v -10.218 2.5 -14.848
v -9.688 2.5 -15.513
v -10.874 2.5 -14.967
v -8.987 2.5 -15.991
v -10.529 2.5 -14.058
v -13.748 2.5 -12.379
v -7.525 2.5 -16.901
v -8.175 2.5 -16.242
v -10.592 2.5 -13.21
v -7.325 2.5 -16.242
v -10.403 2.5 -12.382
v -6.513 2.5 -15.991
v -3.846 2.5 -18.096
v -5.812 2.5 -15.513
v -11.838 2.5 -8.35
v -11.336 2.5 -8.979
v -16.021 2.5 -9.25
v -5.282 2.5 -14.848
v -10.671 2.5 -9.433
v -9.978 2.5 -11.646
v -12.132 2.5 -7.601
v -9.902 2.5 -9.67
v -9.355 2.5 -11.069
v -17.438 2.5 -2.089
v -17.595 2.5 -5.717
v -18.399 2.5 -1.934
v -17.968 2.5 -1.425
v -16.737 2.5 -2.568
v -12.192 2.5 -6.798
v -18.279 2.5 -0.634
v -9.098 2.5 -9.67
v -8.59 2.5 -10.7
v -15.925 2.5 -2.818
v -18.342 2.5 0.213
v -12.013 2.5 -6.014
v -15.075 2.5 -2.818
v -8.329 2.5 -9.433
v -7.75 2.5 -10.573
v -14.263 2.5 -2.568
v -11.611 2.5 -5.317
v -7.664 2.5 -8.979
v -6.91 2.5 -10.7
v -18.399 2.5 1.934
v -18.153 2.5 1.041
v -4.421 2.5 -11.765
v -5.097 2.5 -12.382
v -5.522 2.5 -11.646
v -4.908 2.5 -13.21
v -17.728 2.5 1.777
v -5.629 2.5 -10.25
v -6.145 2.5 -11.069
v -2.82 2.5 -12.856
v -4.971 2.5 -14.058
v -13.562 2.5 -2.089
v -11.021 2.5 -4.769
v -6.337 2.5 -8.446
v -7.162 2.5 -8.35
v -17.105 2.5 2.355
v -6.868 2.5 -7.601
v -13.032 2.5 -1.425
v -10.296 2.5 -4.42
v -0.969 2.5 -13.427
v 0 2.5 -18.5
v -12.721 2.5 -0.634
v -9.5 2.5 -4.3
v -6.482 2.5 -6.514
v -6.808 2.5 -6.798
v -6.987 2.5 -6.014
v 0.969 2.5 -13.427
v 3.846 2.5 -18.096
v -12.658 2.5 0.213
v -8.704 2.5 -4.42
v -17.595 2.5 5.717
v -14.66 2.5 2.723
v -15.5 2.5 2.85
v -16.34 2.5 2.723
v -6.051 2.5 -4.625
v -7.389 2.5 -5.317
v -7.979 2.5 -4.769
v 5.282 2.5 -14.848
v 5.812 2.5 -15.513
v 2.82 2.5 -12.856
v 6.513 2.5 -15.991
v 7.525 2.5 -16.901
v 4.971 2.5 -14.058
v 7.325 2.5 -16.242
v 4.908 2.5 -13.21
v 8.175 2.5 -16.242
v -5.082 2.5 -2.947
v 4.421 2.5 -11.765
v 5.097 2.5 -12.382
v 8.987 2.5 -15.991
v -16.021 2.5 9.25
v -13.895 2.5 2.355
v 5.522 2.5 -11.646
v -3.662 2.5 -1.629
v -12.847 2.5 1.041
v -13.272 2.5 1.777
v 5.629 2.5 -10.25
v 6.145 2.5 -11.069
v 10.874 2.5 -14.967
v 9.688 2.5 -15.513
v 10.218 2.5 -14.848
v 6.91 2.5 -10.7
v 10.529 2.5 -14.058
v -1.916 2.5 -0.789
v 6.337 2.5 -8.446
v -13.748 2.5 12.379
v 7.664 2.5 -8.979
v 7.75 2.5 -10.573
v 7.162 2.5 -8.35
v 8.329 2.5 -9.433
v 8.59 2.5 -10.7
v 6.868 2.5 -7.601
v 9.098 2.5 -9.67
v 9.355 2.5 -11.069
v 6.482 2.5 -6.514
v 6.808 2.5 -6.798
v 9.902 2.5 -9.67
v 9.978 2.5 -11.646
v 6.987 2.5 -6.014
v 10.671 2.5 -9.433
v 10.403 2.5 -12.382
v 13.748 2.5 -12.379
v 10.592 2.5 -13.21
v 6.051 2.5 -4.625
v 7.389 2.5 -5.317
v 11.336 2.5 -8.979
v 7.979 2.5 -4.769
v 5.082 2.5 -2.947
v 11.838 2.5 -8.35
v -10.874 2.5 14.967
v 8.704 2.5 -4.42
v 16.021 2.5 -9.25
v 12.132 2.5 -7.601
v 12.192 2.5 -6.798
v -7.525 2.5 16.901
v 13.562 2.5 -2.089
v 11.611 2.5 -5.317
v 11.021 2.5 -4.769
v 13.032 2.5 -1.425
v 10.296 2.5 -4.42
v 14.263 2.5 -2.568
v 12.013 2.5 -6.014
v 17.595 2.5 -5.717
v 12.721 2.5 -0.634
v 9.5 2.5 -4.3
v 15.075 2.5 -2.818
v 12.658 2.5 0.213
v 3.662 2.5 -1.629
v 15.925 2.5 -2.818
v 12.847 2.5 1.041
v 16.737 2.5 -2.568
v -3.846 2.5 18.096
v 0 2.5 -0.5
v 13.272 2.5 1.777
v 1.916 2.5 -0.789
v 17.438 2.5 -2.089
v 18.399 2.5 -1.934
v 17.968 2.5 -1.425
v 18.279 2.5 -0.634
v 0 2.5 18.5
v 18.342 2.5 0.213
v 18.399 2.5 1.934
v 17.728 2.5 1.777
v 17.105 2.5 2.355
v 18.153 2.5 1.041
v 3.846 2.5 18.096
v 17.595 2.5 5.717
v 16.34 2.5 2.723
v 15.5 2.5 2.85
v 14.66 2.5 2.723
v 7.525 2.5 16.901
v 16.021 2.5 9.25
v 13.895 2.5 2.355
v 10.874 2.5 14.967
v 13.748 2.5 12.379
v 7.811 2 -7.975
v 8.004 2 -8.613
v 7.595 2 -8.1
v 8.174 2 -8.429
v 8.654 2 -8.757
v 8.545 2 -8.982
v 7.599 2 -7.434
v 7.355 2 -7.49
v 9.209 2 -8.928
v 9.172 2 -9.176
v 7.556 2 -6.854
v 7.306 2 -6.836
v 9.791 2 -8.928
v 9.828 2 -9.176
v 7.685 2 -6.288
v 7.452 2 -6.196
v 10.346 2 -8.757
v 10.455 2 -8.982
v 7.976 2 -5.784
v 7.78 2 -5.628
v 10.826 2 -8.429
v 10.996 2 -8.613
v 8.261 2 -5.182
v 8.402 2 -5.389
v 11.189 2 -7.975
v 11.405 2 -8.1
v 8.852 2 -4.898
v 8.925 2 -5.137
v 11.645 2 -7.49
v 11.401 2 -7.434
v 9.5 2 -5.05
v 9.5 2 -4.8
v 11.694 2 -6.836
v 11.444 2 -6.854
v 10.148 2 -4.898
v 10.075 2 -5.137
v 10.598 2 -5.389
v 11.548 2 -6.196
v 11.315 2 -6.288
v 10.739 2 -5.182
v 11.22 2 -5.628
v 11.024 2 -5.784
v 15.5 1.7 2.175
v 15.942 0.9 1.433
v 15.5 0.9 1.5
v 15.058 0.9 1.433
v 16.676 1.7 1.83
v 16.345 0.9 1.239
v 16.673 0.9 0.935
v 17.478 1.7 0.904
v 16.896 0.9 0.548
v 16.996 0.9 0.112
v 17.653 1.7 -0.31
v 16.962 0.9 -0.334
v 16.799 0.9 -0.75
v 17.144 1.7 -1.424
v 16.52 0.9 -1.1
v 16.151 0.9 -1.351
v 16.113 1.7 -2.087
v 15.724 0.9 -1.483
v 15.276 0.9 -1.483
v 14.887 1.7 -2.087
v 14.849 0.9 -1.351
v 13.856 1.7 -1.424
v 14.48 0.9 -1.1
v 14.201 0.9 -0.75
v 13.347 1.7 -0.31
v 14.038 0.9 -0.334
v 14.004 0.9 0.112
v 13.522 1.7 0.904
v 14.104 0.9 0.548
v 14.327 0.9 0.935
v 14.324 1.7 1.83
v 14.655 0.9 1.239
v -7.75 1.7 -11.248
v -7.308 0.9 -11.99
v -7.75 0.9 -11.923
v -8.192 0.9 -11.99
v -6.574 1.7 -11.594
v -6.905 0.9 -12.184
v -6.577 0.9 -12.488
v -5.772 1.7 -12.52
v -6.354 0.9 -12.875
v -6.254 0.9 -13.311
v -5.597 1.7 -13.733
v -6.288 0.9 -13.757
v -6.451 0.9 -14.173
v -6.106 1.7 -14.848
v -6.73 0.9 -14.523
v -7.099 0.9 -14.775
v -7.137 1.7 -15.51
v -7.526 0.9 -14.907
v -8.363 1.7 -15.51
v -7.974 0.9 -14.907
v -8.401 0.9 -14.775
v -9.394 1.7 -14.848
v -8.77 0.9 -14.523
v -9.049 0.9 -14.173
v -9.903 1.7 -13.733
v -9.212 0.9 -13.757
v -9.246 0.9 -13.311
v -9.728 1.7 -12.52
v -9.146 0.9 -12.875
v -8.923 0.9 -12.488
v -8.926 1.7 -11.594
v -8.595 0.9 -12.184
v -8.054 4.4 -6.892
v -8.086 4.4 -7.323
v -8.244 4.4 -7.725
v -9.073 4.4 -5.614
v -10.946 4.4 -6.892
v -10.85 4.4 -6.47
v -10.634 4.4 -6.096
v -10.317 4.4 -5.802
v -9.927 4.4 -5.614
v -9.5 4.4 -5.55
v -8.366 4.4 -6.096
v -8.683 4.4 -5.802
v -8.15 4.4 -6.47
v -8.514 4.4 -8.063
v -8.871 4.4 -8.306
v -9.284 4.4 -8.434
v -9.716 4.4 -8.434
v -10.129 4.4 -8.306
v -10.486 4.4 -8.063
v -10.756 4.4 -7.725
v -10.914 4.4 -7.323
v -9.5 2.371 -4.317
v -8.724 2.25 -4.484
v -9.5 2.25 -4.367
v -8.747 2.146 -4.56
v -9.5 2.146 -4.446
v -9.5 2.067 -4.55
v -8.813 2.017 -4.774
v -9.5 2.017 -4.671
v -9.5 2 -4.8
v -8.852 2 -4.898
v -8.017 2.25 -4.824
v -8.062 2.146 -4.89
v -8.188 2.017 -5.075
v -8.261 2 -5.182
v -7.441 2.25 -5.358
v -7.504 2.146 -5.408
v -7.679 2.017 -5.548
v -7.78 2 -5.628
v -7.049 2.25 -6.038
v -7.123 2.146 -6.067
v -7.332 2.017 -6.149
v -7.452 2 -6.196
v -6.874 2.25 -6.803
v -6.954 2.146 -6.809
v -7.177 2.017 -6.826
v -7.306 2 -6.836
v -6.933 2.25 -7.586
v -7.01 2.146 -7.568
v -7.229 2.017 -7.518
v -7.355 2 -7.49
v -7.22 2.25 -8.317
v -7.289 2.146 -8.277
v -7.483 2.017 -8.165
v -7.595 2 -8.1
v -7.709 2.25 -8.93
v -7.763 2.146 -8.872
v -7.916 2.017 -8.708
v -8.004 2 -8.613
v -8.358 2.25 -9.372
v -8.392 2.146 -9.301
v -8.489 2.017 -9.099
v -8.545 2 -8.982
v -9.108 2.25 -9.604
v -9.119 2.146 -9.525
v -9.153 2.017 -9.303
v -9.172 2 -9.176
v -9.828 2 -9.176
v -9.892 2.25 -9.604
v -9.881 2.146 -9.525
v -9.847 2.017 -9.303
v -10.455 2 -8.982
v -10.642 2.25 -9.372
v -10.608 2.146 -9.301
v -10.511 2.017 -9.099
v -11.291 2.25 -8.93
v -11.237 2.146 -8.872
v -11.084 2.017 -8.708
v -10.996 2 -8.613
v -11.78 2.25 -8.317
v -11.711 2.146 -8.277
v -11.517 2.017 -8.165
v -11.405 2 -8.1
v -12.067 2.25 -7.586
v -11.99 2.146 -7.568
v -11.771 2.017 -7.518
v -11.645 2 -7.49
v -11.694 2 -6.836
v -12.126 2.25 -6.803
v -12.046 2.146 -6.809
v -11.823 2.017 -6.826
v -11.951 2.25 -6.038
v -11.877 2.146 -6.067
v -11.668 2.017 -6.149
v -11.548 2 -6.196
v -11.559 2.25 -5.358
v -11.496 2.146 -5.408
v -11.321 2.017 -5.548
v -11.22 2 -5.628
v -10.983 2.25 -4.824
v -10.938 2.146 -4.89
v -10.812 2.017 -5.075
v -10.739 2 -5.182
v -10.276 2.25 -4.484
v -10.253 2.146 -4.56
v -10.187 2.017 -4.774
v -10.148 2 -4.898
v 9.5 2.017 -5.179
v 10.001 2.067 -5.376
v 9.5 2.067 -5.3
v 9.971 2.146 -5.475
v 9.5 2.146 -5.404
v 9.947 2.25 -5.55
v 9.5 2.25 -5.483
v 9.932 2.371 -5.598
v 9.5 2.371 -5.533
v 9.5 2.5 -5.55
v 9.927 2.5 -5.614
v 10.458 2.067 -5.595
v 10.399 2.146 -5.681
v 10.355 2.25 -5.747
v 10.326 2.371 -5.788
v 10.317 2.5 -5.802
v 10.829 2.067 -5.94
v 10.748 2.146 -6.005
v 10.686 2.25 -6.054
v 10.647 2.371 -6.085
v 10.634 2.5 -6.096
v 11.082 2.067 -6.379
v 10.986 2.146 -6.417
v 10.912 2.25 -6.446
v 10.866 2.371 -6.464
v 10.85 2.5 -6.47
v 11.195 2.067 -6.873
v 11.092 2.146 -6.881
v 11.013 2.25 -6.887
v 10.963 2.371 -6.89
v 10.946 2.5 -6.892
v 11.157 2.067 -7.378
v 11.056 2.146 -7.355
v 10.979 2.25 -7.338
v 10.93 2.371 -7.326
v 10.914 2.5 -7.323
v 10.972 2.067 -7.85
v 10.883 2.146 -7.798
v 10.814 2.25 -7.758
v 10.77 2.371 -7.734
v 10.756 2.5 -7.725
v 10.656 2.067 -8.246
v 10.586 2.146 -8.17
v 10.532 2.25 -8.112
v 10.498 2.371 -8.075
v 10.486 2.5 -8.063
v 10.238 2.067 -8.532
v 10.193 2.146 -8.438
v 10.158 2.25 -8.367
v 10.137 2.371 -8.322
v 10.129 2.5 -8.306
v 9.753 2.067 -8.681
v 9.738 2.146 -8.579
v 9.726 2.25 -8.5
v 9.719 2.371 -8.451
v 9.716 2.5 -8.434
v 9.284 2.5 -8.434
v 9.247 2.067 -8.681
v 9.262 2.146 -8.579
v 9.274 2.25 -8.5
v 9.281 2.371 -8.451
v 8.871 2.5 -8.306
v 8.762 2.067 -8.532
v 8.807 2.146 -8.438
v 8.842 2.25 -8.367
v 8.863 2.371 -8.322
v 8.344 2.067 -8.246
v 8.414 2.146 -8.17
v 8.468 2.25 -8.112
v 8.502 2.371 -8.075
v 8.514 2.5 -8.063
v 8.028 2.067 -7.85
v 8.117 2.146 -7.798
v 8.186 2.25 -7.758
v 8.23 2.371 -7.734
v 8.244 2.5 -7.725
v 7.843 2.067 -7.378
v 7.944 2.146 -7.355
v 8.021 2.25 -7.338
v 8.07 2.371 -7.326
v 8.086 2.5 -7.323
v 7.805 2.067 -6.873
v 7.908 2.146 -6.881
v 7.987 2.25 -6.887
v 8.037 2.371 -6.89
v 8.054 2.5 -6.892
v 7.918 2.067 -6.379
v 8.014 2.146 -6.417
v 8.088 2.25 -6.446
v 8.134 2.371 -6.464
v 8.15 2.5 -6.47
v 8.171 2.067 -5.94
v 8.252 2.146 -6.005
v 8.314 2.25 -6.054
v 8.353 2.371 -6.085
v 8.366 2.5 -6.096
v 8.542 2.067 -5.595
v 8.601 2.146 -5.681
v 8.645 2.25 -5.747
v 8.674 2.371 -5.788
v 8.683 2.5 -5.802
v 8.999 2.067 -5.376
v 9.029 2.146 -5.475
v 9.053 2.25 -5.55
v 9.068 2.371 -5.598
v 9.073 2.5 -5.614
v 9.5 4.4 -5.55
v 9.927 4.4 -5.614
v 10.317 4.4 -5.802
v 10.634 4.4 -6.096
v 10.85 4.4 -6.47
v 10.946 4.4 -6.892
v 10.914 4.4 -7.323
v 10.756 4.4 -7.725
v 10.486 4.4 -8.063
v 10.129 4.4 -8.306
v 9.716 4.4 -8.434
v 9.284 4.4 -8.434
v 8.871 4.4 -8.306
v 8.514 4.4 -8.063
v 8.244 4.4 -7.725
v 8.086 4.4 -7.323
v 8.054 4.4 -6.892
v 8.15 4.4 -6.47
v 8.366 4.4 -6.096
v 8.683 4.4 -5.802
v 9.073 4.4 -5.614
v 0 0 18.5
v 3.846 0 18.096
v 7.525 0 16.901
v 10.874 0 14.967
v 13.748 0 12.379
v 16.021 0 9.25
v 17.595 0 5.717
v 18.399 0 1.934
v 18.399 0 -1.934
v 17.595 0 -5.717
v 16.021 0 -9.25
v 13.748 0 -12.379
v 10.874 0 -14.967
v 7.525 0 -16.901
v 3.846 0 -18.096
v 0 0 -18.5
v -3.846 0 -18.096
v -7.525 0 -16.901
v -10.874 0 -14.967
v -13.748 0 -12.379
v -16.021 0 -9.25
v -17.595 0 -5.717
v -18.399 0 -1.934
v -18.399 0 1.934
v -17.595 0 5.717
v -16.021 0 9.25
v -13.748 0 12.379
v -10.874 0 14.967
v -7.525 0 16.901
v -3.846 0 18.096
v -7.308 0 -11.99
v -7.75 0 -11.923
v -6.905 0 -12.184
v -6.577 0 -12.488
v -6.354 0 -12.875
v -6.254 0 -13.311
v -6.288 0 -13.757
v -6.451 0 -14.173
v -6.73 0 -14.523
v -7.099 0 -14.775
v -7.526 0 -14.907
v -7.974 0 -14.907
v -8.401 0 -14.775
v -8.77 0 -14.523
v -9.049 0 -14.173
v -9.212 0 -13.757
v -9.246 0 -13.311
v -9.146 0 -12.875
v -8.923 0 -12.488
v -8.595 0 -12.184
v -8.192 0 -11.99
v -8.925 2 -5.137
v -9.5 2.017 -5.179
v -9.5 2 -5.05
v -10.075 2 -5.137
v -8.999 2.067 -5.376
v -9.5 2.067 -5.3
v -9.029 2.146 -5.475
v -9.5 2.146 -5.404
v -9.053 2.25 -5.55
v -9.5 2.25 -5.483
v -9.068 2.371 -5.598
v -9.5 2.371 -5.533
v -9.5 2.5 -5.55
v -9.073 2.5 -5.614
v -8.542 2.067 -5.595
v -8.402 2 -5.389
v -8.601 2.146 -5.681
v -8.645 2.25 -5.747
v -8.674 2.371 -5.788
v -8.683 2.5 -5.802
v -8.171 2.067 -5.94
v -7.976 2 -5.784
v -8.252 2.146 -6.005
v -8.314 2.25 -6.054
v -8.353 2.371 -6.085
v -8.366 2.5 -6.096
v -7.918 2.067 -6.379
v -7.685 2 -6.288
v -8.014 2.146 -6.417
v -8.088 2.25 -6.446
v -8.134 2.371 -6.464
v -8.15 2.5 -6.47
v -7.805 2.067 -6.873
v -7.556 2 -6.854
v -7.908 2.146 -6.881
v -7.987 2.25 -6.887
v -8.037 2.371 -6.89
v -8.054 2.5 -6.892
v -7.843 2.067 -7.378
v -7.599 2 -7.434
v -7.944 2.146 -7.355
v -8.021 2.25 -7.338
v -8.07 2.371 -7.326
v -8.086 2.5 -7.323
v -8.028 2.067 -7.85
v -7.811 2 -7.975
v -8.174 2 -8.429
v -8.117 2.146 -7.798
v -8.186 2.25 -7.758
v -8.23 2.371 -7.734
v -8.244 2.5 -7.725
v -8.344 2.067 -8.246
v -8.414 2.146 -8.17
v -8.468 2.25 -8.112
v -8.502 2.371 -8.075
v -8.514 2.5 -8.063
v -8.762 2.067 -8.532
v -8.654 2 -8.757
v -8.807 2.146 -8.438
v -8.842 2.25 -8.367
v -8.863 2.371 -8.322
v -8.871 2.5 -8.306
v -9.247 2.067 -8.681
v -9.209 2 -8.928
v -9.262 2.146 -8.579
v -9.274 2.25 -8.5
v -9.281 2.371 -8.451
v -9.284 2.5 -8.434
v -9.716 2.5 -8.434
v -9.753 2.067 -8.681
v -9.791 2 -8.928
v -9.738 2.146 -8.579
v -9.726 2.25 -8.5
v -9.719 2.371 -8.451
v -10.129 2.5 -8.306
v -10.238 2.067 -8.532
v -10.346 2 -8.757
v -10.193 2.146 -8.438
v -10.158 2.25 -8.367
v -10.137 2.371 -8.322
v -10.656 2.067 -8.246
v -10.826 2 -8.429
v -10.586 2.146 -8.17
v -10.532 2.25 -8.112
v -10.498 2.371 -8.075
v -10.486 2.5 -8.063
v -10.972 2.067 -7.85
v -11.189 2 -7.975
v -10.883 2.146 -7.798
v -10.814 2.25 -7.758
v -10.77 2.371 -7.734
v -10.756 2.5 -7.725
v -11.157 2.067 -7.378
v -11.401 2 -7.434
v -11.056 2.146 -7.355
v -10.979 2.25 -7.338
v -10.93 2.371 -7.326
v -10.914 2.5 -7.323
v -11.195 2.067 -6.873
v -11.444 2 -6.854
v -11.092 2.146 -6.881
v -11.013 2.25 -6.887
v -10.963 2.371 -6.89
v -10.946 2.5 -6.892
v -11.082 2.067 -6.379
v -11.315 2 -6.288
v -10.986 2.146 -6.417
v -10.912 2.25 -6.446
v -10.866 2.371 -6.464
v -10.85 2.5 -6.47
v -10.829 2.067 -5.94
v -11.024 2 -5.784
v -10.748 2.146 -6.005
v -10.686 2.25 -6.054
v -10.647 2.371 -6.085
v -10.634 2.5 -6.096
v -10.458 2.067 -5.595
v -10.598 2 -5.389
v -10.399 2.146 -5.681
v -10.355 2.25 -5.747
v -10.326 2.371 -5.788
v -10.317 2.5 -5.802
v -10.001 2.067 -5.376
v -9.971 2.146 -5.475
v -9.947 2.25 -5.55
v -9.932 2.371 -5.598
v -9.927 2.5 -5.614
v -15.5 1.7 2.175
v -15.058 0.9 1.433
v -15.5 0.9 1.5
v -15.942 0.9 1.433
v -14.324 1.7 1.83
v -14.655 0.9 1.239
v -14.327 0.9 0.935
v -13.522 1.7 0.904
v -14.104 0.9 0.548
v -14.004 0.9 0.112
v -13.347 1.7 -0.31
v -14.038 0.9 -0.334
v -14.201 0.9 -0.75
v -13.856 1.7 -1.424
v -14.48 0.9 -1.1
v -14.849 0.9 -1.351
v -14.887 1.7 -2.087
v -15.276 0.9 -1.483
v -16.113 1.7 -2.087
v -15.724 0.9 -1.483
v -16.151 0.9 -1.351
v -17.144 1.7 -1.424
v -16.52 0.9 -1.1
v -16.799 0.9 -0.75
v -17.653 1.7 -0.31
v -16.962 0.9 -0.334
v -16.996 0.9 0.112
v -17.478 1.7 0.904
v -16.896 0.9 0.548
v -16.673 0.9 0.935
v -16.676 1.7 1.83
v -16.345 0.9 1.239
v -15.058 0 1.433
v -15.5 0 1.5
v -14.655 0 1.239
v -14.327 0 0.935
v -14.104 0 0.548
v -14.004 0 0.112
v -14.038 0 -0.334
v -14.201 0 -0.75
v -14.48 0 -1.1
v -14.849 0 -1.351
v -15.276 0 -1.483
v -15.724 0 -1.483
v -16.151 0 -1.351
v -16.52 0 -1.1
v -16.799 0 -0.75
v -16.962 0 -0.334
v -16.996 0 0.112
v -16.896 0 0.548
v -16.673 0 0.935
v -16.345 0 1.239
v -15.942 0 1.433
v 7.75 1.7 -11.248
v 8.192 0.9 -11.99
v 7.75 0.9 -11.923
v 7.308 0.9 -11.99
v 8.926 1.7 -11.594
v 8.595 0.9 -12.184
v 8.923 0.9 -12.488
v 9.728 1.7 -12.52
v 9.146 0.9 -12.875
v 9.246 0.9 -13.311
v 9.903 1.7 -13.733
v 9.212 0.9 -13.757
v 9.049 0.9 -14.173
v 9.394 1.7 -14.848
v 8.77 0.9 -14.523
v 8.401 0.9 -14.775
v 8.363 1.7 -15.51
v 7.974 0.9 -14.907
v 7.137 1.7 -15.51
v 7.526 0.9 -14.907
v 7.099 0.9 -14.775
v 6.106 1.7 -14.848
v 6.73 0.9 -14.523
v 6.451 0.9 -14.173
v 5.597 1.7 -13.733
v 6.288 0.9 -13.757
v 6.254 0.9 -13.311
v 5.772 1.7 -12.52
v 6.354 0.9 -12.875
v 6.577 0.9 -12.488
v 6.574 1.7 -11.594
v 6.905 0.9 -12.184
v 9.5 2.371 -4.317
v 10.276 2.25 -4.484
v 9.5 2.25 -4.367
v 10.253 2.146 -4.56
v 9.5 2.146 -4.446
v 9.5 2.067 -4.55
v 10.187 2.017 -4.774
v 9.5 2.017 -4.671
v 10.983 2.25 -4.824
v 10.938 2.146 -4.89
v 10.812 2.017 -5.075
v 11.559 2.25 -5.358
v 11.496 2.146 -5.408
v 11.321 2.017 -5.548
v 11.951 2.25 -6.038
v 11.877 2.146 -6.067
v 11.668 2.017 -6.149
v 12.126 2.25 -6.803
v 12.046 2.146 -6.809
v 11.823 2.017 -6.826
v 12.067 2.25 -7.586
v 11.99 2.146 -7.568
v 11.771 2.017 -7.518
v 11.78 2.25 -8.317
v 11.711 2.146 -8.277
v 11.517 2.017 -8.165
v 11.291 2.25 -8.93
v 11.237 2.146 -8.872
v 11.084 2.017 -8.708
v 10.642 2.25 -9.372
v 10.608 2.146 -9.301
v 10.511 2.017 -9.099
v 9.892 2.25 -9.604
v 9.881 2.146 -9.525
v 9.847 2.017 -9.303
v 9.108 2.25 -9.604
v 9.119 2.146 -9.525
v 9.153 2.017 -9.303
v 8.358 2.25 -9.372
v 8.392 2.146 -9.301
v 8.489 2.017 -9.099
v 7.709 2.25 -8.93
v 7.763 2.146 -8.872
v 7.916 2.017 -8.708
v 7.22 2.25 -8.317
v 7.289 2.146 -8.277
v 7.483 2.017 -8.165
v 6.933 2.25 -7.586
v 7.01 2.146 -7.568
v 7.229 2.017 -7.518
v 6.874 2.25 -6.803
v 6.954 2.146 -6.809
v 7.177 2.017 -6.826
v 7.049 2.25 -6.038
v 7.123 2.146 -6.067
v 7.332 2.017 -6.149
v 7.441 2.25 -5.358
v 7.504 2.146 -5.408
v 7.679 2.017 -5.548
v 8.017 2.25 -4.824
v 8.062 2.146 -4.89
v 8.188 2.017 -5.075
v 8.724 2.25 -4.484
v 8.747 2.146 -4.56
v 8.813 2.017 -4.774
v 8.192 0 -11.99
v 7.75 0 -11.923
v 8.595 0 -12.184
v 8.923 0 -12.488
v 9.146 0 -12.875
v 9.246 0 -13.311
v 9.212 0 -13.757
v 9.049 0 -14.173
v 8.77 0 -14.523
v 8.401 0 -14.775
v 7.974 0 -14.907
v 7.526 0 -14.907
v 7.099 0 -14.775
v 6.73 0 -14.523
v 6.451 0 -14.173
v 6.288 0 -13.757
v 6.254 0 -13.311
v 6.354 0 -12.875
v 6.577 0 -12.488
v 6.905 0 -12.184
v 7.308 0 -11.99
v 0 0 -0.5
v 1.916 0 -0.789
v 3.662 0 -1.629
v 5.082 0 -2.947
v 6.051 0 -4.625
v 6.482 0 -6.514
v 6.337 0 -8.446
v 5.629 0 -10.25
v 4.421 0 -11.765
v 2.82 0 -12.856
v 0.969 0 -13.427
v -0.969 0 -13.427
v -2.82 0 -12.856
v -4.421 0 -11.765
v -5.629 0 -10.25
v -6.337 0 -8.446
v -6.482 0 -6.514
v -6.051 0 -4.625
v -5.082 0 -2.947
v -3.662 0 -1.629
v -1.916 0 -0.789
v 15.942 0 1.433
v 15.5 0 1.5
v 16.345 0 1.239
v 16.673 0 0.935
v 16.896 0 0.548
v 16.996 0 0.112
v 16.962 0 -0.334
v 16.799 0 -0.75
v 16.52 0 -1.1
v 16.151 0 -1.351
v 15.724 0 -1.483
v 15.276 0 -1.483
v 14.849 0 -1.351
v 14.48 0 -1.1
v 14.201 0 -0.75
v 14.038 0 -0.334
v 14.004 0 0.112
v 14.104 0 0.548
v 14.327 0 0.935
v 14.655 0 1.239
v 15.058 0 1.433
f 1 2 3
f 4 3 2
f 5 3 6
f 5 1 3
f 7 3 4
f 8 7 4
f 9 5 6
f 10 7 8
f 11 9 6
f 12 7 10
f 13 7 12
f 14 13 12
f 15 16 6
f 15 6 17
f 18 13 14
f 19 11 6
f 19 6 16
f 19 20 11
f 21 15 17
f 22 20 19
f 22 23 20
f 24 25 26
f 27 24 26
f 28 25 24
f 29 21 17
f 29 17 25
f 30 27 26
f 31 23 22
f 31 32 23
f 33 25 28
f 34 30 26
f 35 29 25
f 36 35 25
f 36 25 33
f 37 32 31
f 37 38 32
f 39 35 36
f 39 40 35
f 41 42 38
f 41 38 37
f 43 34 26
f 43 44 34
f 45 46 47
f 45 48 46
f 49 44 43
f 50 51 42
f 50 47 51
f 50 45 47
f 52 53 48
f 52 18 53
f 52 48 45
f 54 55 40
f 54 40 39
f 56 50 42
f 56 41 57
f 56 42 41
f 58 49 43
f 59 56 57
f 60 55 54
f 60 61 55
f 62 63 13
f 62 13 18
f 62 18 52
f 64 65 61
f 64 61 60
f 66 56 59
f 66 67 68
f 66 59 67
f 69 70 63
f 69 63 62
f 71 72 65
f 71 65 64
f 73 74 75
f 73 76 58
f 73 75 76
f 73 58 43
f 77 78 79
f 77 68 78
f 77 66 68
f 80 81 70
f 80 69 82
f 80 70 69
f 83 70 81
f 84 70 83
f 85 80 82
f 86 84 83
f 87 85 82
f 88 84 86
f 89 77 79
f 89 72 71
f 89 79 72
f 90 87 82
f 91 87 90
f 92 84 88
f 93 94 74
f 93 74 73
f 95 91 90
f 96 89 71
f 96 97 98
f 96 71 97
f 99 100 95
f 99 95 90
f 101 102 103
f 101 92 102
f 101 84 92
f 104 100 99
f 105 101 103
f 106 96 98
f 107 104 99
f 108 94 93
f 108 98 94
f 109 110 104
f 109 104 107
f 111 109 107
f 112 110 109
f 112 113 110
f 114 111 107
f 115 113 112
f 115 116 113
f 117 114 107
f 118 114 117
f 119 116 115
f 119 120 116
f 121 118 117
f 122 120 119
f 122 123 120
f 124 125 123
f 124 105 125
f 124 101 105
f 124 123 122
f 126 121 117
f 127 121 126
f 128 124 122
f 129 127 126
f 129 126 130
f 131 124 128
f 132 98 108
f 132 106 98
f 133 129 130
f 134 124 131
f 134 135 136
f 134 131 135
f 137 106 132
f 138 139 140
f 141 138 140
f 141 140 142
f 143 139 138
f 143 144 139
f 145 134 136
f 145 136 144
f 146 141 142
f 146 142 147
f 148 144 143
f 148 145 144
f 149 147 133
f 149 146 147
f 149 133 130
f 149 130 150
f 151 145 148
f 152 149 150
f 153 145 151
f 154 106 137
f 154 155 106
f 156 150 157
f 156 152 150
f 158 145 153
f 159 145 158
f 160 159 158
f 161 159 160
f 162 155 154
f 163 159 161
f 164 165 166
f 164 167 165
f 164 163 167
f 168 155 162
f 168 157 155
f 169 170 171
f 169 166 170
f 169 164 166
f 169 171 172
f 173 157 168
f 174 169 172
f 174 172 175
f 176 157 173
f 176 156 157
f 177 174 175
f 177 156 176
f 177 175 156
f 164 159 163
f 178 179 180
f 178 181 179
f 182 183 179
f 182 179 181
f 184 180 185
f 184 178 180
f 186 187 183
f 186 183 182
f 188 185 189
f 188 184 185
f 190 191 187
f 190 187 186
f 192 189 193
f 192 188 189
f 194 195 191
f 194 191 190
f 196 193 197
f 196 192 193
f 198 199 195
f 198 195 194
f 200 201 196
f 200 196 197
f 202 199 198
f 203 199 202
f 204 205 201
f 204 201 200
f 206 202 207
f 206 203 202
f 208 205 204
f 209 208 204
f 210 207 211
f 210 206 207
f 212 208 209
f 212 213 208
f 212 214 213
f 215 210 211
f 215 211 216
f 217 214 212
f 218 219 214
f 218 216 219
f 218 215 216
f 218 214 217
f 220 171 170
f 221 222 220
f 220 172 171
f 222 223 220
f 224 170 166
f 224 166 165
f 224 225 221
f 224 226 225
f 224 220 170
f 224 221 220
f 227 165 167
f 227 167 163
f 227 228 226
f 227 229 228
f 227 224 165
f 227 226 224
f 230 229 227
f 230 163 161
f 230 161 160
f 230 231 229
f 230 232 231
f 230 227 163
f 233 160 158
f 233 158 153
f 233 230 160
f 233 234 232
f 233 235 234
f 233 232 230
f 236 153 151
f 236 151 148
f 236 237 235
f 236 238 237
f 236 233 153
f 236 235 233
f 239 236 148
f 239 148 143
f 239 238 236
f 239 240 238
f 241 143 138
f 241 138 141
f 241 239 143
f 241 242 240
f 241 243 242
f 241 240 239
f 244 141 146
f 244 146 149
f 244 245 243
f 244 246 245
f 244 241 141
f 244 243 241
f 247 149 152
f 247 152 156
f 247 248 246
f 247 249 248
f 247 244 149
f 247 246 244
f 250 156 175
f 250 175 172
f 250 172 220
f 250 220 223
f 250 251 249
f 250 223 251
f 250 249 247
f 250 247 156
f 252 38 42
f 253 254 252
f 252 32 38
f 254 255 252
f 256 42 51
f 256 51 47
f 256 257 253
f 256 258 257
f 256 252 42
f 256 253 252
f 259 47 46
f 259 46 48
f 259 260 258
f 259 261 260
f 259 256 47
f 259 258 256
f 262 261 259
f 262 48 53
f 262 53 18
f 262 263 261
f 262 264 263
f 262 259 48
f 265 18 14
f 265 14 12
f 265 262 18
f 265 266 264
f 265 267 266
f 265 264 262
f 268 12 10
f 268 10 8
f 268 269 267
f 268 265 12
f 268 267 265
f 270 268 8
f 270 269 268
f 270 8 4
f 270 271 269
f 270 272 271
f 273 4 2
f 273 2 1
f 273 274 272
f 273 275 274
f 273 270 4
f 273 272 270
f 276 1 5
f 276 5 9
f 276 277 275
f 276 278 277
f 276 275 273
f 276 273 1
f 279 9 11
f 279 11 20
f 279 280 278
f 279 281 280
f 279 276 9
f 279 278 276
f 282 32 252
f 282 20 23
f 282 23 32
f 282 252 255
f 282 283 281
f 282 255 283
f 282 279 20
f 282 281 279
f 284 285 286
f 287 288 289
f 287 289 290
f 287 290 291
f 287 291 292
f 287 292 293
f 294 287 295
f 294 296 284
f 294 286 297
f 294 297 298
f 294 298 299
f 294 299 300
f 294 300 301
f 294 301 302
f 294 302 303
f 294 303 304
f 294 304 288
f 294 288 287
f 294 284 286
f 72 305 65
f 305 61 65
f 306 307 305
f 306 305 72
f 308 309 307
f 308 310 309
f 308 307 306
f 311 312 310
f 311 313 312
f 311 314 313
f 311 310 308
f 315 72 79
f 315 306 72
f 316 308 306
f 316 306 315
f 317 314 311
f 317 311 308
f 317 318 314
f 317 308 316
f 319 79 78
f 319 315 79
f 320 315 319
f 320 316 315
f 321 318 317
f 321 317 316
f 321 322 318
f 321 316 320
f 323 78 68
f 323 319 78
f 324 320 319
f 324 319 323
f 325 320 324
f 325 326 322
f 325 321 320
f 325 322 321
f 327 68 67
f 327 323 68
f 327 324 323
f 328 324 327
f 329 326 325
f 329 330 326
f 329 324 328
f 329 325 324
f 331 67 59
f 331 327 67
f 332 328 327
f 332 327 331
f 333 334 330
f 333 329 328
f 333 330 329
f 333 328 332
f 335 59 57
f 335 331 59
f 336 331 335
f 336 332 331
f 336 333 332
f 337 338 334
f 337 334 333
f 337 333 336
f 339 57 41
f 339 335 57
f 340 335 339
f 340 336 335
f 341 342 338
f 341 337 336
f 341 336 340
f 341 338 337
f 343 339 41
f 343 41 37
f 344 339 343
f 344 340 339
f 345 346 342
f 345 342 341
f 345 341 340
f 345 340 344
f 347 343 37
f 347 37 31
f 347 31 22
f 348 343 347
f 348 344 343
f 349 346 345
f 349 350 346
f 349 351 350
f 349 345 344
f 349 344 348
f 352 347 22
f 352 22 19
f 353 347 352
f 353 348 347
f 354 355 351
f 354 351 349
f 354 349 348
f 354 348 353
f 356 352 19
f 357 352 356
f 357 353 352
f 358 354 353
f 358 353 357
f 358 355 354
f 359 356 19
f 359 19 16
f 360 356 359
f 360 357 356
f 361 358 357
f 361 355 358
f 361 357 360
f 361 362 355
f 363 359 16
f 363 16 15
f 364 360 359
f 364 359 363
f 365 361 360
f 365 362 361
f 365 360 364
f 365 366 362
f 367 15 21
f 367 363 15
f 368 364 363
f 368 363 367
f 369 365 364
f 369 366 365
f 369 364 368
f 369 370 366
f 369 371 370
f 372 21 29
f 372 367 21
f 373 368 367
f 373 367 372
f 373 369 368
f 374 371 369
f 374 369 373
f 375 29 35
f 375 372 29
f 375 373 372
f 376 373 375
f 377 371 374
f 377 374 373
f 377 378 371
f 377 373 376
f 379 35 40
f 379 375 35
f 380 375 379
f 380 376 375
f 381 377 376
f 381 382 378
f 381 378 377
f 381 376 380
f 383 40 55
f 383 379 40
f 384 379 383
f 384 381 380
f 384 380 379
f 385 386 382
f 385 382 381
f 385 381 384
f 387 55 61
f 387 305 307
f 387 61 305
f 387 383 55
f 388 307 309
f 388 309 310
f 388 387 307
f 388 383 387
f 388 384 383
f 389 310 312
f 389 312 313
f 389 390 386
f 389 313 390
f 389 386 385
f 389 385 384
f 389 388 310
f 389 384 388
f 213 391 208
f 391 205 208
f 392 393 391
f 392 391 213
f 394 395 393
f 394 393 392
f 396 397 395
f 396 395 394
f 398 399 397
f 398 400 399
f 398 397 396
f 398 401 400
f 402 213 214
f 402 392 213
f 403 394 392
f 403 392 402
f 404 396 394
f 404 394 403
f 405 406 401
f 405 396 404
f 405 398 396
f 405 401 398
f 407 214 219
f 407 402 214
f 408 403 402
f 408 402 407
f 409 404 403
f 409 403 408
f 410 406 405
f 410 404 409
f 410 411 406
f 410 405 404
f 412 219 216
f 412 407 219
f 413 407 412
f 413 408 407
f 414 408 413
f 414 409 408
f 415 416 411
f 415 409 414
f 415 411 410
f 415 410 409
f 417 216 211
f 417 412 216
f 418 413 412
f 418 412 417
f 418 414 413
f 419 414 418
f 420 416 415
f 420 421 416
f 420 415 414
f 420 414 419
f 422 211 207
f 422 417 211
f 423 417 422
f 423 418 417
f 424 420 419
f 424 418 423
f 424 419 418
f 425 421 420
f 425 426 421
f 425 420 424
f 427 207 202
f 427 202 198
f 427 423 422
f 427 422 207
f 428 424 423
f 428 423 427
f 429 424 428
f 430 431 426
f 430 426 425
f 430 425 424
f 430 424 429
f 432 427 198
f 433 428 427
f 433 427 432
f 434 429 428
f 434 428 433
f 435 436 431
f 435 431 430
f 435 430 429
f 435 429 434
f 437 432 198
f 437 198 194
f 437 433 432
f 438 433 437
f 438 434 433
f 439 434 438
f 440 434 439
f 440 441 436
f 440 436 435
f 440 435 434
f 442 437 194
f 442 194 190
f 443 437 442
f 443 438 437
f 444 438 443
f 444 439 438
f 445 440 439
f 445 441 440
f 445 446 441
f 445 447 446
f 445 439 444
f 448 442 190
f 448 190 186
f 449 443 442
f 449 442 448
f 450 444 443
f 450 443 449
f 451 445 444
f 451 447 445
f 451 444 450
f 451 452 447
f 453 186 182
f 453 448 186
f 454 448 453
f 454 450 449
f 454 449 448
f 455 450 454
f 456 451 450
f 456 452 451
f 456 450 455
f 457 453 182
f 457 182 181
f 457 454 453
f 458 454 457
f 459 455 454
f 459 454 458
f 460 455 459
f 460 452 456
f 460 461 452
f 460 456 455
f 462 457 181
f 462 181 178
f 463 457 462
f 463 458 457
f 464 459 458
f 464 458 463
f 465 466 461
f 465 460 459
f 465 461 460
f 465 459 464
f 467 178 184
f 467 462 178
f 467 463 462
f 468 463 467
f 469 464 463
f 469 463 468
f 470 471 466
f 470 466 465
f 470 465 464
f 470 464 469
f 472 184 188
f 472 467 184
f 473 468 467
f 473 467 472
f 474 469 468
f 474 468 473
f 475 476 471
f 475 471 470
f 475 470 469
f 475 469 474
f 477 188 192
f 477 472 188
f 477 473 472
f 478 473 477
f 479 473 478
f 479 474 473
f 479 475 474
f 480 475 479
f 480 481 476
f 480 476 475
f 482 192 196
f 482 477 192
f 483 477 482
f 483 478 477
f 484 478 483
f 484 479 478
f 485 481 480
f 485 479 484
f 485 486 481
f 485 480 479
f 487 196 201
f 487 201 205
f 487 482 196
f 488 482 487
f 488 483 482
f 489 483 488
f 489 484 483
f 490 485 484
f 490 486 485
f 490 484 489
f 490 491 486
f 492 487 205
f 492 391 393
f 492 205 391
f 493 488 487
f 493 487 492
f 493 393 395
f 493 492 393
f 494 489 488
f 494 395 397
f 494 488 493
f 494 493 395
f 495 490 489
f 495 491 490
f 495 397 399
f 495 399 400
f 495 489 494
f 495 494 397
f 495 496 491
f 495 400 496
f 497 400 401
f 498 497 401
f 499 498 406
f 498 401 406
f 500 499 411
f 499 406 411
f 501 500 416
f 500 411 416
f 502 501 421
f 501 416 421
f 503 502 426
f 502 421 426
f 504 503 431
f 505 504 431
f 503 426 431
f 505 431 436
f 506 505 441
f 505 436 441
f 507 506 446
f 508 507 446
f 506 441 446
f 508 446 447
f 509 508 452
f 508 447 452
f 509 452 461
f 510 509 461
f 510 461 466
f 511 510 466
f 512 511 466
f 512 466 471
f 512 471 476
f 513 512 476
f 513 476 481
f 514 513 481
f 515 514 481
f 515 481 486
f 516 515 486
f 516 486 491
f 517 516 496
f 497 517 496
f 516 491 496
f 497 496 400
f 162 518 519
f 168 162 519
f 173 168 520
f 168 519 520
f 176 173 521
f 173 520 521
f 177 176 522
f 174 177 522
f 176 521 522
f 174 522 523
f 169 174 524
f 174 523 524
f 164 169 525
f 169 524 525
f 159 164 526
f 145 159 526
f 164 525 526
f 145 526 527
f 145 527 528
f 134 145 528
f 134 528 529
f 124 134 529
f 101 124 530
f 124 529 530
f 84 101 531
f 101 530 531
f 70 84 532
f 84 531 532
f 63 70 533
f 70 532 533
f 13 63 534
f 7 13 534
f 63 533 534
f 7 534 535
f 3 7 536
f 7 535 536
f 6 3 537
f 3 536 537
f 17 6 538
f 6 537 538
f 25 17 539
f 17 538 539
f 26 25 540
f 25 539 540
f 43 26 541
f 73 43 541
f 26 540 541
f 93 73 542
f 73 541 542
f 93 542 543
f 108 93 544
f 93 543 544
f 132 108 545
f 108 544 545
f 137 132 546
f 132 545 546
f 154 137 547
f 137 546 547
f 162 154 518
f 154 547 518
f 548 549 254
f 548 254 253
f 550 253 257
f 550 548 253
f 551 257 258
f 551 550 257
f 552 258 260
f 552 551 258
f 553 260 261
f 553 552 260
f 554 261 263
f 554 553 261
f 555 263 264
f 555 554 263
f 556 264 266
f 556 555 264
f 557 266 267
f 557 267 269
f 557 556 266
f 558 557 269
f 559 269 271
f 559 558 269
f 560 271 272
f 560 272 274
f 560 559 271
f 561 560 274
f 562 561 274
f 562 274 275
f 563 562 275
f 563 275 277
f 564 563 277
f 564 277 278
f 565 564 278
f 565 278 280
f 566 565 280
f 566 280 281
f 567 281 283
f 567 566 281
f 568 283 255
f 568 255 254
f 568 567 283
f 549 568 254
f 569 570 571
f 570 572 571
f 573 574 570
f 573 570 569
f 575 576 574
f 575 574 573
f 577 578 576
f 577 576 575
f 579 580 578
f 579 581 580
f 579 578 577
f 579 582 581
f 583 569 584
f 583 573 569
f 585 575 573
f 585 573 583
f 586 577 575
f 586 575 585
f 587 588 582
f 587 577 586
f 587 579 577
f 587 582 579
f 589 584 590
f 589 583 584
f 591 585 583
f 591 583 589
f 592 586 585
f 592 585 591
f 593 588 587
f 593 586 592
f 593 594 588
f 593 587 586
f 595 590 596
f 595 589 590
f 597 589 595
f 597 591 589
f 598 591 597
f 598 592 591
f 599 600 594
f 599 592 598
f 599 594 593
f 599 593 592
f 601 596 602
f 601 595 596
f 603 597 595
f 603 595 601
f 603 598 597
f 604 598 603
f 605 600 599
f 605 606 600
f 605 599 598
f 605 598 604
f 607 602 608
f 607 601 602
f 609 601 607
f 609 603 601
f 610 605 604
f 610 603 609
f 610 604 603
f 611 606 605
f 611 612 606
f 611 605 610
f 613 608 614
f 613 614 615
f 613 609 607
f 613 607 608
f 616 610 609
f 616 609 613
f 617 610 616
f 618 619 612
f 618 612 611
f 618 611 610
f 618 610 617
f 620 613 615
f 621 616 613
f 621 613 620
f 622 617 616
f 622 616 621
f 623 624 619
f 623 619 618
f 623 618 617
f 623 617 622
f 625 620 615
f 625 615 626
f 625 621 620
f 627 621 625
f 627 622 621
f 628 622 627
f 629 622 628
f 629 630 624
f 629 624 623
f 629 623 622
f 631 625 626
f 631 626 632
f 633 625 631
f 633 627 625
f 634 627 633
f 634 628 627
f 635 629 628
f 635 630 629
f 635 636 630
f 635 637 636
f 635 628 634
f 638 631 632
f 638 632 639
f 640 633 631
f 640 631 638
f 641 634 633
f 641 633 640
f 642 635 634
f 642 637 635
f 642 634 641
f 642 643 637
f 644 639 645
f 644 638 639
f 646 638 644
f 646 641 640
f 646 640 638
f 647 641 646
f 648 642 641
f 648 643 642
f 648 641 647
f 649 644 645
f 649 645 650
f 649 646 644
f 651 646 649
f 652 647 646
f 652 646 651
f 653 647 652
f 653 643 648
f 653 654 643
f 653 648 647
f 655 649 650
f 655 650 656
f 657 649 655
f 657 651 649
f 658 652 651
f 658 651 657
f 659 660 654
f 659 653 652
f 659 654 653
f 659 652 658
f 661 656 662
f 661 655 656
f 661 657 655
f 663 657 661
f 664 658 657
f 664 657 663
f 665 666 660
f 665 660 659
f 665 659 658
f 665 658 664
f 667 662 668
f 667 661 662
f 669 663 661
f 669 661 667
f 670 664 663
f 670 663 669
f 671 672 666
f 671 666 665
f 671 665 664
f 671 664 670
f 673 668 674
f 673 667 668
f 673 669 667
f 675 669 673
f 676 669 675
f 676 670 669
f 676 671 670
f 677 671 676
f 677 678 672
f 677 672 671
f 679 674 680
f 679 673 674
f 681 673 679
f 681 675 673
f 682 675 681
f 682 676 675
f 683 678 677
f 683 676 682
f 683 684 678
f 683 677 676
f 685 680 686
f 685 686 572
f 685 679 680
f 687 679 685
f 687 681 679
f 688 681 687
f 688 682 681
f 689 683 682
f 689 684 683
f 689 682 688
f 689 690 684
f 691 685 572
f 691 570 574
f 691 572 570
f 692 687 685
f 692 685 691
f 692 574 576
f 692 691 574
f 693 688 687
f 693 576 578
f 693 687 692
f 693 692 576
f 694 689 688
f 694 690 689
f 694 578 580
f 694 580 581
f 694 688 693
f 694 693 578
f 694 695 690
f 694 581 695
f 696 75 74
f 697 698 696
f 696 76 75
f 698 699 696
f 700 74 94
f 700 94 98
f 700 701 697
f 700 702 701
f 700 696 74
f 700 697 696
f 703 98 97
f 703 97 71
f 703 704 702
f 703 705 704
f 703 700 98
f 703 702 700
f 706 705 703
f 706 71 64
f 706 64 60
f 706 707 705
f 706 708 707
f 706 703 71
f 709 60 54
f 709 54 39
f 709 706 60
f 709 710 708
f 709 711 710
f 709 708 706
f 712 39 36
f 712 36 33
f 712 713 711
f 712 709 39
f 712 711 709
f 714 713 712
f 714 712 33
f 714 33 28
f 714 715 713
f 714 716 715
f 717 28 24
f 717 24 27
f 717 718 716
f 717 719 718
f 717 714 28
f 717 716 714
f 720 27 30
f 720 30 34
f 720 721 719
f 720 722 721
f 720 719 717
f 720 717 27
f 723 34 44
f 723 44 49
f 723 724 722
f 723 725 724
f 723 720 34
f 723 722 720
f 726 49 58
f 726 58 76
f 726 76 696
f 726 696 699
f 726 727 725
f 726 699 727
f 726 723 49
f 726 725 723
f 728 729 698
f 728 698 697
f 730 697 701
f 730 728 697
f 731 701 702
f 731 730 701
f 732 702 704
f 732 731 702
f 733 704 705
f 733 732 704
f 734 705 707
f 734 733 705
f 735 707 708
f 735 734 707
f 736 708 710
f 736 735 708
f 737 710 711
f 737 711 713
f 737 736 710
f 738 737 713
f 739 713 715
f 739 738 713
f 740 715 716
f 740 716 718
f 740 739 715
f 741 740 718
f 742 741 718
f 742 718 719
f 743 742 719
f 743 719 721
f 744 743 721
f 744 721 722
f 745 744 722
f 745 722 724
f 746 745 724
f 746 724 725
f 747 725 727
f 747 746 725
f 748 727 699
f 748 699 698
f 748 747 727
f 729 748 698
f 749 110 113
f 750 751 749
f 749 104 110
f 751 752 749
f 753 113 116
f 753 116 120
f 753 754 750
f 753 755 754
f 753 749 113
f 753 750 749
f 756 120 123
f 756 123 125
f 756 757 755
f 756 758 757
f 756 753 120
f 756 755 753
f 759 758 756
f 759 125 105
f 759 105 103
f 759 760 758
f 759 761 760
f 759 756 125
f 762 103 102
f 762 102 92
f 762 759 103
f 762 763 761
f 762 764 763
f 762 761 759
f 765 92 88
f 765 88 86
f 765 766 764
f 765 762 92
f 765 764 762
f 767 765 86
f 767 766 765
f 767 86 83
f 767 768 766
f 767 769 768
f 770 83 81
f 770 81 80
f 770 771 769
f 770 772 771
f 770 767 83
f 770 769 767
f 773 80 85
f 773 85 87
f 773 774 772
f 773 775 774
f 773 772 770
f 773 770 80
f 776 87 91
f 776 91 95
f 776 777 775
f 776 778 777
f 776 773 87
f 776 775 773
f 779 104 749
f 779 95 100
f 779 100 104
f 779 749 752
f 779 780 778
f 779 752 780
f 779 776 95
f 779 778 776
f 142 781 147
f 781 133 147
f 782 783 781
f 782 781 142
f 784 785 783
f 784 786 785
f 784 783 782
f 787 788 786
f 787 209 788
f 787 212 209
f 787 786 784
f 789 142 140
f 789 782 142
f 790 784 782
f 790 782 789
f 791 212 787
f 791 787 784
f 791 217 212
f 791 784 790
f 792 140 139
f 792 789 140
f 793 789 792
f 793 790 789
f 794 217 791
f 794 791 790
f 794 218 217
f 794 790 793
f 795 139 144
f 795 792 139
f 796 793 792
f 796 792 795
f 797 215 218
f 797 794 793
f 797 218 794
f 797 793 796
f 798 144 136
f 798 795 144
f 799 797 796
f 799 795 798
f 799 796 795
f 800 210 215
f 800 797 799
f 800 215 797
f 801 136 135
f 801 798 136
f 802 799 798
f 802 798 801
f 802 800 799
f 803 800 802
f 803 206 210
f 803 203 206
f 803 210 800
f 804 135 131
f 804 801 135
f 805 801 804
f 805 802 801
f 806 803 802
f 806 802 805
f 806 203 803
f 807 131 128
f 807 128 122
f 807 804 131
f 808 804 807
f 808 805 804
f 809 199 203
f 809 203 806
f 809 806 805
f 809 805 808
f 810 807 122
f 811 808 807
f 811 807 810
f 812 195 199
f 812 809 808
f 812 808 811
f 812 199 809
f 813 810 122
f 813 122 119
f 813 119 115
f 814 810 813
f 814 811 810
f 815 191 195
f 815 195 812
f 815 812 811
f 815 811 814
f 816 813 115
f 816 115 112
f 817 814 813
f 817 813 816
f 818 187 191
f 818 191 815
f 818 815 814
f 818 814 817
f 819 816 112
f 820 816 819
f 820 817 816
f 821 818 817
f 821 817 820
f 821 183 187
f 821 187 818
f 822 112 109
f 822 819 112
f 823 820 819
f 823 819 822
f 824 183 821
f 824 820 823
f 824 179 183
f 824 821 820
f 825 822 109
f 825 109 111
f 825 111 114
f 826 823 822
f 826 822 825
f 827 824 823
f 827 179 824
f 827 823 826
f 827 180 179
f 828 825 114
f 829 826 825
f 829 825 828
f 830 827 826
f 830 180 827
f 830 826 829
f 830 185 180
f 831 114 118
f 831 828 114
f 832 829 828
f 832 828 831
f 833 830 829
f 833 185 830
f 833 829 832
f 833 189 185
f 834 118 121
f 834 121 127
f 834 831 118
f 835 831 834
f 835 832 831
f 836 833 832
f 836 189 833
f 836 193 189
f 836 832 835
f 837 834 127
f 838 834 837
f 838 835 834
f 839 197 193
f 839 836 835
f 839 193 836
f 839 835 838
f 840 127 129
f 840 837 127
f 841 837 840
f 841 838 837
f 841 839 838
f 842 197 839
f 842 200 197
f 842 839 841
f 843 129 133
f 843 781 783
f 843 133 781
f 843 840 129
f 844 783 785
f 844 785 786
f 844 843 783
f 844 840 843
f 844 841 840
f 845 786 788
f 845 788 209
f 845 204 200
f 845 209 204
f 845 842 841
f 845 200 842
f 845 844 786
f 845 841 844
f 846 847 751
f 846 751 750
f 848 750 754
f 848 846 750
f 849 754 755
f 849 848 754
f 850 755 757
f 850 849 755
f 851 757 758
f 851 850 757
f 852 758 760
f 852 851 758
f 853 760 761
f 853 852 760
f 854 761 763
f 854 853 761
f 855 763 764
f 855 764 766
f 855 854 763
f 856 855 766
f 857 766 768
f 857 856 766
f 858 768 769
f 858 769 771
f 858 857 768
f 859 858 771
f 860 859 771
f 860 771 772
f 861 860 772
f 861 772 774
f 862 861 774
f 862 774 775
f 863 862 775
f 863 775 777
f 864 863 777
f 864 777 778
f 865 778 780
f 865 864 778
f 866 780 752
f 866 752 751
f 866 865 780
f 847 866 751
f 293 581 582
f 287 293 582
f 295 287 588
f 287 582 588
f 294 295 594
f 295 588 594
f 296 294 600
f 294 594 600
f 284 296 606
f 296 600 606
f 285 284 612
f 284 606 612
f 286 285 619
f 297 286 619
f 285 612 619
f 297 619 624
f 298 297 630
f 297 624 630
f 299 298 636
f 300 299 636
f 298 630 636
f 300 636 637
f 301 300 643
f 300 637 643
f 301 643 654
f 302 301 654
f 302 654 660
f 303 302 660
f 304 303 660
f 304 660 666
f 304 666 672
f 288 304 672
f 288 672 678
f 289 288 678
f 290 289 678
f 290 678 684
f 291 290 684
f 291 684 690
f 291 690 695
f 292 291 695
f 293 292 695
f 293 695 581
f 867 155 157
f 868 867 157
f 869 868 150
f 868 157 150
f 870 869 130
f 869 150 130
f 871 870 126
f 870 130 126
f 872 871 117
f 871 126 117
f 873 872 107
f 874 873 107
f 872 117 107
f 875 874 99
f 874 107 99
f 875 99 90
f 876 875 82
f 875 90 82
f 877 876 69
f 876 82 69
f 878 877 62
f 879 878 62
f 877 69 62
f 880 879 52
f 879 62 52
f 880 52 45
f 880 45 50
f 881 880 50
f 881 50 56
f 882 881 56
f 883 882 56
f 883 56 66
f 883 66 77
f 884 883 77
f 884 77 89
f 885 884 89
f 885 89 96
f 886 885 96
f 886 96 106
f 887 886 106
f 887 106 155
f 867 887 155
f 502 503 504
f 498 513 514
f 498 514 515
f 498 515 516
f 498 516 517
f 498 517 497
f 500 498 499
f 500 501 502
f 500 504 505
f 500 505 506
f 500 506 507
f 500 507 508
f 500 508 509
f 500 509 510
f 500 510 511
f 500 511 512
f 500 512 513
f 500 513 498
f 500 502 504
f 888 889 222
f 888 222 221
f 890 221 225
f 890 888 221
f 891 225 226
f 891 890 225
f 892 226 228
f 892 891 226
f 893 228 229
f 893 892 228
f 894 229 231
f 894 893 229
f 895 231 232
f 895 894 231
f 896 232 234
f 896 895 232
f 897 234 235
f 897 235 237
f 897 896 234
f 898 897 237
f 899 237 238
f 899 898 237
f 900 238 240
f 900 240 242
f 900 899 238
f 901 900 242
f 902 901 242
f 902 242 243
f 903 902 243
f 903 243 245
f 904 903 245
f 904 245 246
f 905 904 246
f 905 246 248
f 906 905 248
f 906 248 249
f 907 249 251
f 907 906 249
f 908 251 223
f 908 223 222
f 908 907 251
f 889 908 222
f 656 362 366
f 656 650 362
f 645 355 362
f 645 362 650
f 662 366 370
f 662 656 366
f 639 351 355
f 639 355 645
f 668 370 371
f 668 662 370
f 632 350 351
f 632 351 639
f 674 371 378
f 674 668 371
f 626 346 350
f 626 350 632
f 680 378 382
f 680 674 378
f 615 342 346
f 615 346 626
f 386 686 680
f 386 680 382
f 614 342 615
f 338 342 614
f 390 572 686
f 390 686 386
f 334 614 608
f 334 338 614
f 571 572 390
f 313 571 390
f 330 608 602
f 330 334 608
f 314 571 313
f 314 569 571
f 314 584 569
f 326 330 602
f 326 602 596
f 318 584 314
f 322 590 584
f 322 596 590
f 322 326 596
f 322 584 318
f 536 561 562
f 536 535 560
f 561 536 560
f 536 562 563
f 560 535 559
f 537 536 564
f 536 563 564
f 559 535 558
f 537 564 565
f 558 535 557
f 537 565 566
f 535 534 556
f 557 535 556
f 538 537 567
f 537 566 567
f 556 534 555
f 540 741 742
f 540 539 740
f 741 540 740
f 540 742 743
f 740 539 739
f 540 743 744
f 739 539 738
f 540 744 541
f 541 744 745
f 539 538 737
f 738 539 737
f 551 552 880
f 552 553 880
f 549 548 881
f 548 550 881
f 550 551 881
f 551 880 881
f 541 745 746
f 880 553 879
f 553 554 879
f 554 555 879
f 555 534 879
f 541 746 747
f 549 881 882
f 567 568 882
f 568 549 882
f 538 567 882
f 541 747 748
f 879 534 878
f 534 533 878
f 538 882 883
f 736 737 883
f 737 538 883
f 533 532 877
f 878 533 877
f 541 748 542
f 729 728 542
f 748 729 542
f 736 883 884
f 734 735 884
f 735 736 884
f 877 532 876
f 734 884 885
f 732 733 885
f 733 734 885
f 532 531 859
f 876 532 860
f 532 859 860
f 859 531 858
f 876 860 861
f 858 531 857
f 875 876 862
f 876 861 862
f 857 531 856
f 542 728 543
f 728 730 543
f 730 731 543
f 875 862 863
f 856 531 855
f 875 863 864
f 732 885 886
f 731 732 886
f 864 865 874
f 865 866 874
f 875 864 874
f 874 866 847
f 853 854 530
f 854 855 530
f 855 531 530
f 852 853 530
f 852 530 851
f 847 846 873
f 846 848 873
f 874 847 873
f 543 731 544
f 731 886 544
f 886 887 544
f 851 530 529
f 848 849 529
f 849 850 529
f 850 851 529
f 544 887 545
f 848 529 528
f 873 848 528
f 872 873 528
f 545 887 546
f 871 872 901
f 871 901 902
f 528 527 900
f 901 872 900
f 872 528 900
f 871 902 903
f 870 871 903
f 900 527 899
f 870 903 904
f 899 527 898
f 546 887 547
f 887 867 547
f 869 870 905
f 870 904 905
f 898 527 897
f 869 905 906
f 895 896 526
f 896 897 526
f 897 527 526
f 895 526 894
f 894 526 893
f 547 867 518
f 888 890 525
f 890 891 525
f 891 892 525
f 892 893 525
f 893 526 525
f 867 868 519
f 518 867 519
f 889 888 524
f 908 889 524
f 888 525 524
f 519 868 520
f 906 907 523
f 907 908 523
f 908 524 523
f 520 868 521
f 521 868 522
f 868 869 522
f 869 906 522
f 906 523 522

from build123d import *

# Parameters (mm, degrees)
SKETCH1_R                = 18.5
SKETCH1_R_2              = 1.5
BOSS_EXTRUDE1_DEPTH      = 2.5
BOSS_EXTRUDE2_DEPTH      = 1.9
BOSS_EXTRUDE2_DEPTH_BACK = 1
SKETCH2_R                = 1.45
CUT_EXTRUDE3_START       = -0.5
SKETCH6_R                = 2.7
SKETCH6_R_2              = 1.45
CUT_EXTRUDE3_DEPTH       = 0.5
SKETCH4_R                = 6.5
CUT_EXTRUDE1_DEPTH       = 27.282123202
CHAMFER1_SIZE            = 1.35
CHAMFER1_SIZE2           = 1.6
FILLET1_R                = 0.5


with BuildPart() as part:
    # Sketch1 → Boss-Extrude1 (new body)
    with BuildSketch(Plane(origin=(0, 0, 0), x_dir=(1, 0, 0), z_dir=(0, 1, 0))):
        with Locations(Location((0, 0, 0), (0, 0, 270))):
            Circle(SKETCH1_R)
        with Locations(Location((-7.75, 13.423393759, 0), (0, 0, 270))):
            Circle(SKETCH1_R_2, mode=Mode.SUBTRACT)
        with Locations(Location((-15.5, 0, 0), (0, 0, 270))):
            Circle(SKETCH1_R_2, mode=Mode.SUBTRACT)
        with Locations(Location((7.75, 13.423393759, 0), (0, 0, 270))):
            Circle(SKETCH1_R_2, mode=Mode.SUBTRACT)
        with Locations(Location((15.5, 0, 0), (0, 0, 270))):
            Circle(SKETCH1_R_2, mode=Mode.SUBTRACT)
    extrude(amount=BOSS_EXTRUDE1_DEPTH)

    # Sketch2 → Boss-Extrude2 (add, two sides: drawn at the far end of the back side and taken through both)
    with BuildSketch(Plane(origin=(0, 2.5, 0), x_dir=(1, 0, 0), z_dir=(0, 1, 0)).offset(-BOSS_EXTRUDE2_DEPTH_BACK)):
        with Locations(Location((-9.5, 7, 0), (0, 0, 270))):
            Circle(SKETCH2_R)
        with Locations(Location((9.5, 7, 0), (0, 0, 270))):
            Circle(SKETCH2_R)
    extrude(amount=BOSS_EXTRUDE2_DEPTH + BOSS_EXTRUDE2_DEPTH_BACK)

    # Sketch6 → Cut-Extrude3 (cut)
    # profile 1 of 2: a face of its own
    with BuildSketch(Plane(origin=(0, 2.5, 0), x_dir=(1, 0, 0), z_dir=(0, 1, 0)).offset(CUT_EXTRUDE3_START)):
        with Locations(Location((-9.5, 7, 0), (0, 0, 270))):
            Circle(SKETCH6_R)
        with Locations(Location((-9.5, 7, 0), (0, 0, 270))):
            Circle(SKETCH6_R_2, mode=Mode.SUBTRACT)
    # profile 2 of 2: a face of its own
    with BuildSketch(Plane(origin=(0, 2.5, 0), x_dir=(1, 0, 0), z_dir=(0, 1, 0)).offset(CUT_EXTRUDE3_START)):
        with Locations(Location((9.5, 7, 0), (0, 0, 270))):
            Circle(SKETCH6_R)
        with Locations(Location((9.5, 7, 0), (0, 0, 270))):
            Circle(SKETCH6_R_2, mode=Mode.SUBTRACT)
    extrude(amount=CUT_EXTRUDE3_DEPTH, mode=Mode.SUBTRACT)

    # Sketch4 → Cut-Extrude1 (cut, through all)
    with BuildSketch(Plane(origin=(0, 2.5, 0), x_dir=(1, 0, 0), z_dir=(0, 1, 0))):
        with Locations(Location((0, 7, 0), (0, 0, 270))):
            Circle(SKETCH4_R)
    extrude(amount=-CUT_EXTRUDE1_DEPTH, mode=Mode.SUBTRACT)

    # Chamfer1
    chamfer1_edges = [part.edges().sort_by_distance(p)[0] for p in [
        (7.75, 2.5, -14.923393759),
        (15.5, 2.5, -1.5),
        (-7.75, 2.5, -14.923393759),
        (-15.5, 2.5, -1.5),
    ]]
    chamfer1_side = [part.faces().sort_by_distance(p)[0] for p in [
        (0, 2.5, 1.657677708),
    ]]
    chamfer(chamfer1_edges, length=CHAMFER1_SIZE, length2=CHAMFER1_SIZE2, reference=chamfer1_side[0])

    # Fillet1
    fillet1_edges = [part.edges().sort_by_distance(p)[0] for p in [
        (-9.5, 2, -9.7),
        (-9.5, 2, -8.45),
        (9.5, 2, -9.7),
        (9.5, 2, -8.45),
    ]]
    fillet(fillet1_edges, radius=FILLET1_R - 0.0001)  # a hair under: the kernel refuses the full size


solid = part.part
